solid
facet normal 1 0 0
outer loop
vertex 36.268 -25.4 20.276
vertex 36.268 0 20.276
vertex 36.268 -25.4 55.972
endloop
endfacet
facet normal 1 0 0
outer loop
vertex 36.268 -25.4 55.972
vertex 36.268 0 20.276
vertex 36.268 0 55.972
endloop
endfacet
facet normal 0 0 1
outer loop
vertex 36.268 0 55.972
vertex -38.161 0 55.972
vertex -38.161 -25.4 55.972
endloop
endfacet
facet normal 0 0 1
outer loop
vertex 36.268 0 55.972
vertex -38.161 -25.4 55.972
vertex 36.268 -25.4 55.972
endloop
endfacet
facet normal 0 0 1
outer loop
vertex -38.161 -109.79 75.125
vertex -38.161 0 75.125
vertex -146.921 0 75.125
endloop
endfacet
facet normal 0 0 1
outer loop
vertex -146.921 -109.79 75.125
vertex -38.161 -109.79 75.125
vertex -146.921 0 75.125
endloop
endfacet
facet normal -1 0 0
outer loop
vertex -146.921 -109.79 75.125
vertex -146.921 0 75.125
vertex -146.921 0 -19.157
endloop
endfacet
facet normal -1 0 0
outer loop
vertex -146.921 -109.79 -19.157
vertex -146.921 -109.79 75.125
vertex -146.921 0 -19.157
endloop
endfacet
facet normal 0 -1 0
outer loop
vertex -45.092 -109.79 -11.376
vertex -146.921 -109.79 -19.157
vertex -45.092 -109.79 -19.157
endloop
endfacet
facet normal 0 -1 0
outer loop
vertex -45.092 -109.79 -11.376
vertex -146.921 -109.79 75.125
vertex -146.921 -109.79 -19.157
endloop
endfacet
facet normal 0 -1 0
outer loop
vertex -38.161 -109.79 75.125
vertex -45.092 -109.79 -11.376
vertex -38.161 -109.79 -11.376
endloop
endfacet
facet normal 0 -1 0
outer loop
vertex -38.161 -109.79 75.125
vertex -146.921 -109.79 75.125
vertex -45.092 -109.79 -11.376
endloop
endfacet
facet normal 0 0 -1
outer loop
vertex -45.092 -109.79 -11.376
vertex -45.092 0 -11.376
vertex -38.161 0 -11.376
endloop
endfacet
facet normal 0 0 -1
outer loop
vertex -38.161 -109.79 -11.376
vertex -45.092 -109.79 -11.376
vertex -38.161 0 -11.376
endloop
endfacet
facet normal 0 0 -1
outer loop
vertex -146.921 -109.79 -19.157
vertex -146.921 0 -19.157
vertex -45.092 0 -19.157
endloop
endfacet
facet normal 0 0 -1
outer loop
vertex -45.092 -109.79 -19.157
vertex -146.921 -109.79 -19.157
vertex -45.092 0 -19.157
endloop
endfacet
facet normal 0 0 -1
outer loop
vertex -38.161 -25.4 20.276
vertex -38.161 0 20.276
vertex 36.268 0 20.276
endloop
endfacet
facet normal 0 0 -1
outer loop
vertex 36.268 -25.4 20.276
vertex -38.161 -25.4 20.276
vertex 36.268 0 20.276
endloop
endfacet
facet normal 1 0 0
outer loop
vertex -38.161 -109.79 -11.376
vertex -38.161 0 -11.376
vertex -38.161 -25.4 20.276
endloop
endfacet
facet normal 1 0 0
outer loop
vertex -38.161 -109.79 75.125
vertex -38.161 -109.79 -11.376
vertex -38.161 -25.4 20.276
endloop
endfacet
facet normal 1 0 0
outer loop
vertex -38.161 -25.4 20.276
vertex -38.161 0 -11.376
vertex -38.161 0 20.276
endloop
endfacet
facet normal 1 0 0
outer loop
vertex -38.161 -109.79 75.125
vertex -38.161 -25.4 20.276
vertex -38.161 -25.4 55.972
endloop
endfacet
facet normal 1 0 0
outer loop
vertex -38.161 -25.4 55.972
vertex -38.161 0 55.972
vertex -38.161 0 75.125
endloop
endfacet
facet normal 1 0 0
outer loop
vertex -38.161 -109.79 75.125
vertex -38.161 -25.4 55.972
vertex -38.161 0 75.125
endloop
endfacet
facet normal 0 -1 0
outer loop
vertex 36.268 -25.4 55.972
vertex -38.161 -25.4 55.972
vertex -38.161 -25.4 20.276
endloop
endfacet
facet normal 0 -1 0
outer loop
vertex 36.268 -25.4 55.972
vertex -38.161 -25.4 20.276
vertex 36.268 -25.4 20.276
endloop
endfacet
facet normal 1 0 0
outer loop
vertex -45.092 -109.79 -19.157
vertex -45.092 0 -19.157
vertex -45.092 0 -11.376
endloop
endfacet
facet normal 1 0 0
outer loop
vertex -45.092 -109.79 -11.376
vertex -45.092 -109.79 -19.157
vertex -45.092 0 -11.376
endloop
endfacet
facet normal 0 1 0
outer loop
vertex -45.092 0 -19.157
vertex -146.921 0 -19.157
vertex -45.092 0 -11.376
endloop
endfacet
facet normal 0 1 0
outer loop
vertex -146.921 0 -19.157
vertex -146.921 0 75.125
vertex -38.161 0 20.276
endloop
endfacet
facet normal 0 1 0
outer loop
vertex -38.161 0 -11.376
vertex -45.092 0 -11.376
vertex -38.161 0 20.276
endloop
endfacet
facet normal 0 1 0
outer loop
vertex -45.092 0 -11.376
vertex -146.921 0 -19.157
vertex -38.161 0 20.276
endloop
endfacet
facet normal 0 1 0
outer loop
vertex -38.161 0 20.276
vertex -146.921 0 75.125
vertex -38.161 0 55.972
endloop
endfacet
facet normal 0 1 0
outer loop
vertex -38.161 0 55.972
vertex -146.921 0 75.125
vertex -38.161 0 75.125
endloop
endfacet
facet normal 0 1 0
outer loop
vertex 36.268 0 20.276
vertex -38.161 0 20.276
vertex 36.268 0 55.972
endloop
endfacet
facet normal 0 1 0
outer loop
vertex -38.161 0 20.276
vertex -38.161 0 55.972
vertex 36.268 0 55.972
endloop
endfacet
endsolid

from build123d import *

# Parameters (mm, degrees)
F0_W     = 77.10462
F0_H     = 35.696581
F1_DEPTH = 25.4
F4_DEPTH = 109.789906


with BuildPart() as f1:
    # F0 (on Front) → F1 (new body)
    with BuildSketch(Plane.XZ):
        with Locations((-2.284579, 38.12395)):
            Rectangle(F0_W, F0_H)
    extrude(amount=F1_DEPTH)

    # F3 (on face) → F4 (join)
    with BuildSketch(Plane.XZ):
        Polygon((-146.92077, -19.15716), (-45.091689, -19.15716), (-45.091689, -11.375816), (-38.160954, -11.375816), (-38.160954, 75.124502), (-146.92077, 75.124502), align=None)
    extrude(amount=F4_DEPTH)


solid = f1.part
